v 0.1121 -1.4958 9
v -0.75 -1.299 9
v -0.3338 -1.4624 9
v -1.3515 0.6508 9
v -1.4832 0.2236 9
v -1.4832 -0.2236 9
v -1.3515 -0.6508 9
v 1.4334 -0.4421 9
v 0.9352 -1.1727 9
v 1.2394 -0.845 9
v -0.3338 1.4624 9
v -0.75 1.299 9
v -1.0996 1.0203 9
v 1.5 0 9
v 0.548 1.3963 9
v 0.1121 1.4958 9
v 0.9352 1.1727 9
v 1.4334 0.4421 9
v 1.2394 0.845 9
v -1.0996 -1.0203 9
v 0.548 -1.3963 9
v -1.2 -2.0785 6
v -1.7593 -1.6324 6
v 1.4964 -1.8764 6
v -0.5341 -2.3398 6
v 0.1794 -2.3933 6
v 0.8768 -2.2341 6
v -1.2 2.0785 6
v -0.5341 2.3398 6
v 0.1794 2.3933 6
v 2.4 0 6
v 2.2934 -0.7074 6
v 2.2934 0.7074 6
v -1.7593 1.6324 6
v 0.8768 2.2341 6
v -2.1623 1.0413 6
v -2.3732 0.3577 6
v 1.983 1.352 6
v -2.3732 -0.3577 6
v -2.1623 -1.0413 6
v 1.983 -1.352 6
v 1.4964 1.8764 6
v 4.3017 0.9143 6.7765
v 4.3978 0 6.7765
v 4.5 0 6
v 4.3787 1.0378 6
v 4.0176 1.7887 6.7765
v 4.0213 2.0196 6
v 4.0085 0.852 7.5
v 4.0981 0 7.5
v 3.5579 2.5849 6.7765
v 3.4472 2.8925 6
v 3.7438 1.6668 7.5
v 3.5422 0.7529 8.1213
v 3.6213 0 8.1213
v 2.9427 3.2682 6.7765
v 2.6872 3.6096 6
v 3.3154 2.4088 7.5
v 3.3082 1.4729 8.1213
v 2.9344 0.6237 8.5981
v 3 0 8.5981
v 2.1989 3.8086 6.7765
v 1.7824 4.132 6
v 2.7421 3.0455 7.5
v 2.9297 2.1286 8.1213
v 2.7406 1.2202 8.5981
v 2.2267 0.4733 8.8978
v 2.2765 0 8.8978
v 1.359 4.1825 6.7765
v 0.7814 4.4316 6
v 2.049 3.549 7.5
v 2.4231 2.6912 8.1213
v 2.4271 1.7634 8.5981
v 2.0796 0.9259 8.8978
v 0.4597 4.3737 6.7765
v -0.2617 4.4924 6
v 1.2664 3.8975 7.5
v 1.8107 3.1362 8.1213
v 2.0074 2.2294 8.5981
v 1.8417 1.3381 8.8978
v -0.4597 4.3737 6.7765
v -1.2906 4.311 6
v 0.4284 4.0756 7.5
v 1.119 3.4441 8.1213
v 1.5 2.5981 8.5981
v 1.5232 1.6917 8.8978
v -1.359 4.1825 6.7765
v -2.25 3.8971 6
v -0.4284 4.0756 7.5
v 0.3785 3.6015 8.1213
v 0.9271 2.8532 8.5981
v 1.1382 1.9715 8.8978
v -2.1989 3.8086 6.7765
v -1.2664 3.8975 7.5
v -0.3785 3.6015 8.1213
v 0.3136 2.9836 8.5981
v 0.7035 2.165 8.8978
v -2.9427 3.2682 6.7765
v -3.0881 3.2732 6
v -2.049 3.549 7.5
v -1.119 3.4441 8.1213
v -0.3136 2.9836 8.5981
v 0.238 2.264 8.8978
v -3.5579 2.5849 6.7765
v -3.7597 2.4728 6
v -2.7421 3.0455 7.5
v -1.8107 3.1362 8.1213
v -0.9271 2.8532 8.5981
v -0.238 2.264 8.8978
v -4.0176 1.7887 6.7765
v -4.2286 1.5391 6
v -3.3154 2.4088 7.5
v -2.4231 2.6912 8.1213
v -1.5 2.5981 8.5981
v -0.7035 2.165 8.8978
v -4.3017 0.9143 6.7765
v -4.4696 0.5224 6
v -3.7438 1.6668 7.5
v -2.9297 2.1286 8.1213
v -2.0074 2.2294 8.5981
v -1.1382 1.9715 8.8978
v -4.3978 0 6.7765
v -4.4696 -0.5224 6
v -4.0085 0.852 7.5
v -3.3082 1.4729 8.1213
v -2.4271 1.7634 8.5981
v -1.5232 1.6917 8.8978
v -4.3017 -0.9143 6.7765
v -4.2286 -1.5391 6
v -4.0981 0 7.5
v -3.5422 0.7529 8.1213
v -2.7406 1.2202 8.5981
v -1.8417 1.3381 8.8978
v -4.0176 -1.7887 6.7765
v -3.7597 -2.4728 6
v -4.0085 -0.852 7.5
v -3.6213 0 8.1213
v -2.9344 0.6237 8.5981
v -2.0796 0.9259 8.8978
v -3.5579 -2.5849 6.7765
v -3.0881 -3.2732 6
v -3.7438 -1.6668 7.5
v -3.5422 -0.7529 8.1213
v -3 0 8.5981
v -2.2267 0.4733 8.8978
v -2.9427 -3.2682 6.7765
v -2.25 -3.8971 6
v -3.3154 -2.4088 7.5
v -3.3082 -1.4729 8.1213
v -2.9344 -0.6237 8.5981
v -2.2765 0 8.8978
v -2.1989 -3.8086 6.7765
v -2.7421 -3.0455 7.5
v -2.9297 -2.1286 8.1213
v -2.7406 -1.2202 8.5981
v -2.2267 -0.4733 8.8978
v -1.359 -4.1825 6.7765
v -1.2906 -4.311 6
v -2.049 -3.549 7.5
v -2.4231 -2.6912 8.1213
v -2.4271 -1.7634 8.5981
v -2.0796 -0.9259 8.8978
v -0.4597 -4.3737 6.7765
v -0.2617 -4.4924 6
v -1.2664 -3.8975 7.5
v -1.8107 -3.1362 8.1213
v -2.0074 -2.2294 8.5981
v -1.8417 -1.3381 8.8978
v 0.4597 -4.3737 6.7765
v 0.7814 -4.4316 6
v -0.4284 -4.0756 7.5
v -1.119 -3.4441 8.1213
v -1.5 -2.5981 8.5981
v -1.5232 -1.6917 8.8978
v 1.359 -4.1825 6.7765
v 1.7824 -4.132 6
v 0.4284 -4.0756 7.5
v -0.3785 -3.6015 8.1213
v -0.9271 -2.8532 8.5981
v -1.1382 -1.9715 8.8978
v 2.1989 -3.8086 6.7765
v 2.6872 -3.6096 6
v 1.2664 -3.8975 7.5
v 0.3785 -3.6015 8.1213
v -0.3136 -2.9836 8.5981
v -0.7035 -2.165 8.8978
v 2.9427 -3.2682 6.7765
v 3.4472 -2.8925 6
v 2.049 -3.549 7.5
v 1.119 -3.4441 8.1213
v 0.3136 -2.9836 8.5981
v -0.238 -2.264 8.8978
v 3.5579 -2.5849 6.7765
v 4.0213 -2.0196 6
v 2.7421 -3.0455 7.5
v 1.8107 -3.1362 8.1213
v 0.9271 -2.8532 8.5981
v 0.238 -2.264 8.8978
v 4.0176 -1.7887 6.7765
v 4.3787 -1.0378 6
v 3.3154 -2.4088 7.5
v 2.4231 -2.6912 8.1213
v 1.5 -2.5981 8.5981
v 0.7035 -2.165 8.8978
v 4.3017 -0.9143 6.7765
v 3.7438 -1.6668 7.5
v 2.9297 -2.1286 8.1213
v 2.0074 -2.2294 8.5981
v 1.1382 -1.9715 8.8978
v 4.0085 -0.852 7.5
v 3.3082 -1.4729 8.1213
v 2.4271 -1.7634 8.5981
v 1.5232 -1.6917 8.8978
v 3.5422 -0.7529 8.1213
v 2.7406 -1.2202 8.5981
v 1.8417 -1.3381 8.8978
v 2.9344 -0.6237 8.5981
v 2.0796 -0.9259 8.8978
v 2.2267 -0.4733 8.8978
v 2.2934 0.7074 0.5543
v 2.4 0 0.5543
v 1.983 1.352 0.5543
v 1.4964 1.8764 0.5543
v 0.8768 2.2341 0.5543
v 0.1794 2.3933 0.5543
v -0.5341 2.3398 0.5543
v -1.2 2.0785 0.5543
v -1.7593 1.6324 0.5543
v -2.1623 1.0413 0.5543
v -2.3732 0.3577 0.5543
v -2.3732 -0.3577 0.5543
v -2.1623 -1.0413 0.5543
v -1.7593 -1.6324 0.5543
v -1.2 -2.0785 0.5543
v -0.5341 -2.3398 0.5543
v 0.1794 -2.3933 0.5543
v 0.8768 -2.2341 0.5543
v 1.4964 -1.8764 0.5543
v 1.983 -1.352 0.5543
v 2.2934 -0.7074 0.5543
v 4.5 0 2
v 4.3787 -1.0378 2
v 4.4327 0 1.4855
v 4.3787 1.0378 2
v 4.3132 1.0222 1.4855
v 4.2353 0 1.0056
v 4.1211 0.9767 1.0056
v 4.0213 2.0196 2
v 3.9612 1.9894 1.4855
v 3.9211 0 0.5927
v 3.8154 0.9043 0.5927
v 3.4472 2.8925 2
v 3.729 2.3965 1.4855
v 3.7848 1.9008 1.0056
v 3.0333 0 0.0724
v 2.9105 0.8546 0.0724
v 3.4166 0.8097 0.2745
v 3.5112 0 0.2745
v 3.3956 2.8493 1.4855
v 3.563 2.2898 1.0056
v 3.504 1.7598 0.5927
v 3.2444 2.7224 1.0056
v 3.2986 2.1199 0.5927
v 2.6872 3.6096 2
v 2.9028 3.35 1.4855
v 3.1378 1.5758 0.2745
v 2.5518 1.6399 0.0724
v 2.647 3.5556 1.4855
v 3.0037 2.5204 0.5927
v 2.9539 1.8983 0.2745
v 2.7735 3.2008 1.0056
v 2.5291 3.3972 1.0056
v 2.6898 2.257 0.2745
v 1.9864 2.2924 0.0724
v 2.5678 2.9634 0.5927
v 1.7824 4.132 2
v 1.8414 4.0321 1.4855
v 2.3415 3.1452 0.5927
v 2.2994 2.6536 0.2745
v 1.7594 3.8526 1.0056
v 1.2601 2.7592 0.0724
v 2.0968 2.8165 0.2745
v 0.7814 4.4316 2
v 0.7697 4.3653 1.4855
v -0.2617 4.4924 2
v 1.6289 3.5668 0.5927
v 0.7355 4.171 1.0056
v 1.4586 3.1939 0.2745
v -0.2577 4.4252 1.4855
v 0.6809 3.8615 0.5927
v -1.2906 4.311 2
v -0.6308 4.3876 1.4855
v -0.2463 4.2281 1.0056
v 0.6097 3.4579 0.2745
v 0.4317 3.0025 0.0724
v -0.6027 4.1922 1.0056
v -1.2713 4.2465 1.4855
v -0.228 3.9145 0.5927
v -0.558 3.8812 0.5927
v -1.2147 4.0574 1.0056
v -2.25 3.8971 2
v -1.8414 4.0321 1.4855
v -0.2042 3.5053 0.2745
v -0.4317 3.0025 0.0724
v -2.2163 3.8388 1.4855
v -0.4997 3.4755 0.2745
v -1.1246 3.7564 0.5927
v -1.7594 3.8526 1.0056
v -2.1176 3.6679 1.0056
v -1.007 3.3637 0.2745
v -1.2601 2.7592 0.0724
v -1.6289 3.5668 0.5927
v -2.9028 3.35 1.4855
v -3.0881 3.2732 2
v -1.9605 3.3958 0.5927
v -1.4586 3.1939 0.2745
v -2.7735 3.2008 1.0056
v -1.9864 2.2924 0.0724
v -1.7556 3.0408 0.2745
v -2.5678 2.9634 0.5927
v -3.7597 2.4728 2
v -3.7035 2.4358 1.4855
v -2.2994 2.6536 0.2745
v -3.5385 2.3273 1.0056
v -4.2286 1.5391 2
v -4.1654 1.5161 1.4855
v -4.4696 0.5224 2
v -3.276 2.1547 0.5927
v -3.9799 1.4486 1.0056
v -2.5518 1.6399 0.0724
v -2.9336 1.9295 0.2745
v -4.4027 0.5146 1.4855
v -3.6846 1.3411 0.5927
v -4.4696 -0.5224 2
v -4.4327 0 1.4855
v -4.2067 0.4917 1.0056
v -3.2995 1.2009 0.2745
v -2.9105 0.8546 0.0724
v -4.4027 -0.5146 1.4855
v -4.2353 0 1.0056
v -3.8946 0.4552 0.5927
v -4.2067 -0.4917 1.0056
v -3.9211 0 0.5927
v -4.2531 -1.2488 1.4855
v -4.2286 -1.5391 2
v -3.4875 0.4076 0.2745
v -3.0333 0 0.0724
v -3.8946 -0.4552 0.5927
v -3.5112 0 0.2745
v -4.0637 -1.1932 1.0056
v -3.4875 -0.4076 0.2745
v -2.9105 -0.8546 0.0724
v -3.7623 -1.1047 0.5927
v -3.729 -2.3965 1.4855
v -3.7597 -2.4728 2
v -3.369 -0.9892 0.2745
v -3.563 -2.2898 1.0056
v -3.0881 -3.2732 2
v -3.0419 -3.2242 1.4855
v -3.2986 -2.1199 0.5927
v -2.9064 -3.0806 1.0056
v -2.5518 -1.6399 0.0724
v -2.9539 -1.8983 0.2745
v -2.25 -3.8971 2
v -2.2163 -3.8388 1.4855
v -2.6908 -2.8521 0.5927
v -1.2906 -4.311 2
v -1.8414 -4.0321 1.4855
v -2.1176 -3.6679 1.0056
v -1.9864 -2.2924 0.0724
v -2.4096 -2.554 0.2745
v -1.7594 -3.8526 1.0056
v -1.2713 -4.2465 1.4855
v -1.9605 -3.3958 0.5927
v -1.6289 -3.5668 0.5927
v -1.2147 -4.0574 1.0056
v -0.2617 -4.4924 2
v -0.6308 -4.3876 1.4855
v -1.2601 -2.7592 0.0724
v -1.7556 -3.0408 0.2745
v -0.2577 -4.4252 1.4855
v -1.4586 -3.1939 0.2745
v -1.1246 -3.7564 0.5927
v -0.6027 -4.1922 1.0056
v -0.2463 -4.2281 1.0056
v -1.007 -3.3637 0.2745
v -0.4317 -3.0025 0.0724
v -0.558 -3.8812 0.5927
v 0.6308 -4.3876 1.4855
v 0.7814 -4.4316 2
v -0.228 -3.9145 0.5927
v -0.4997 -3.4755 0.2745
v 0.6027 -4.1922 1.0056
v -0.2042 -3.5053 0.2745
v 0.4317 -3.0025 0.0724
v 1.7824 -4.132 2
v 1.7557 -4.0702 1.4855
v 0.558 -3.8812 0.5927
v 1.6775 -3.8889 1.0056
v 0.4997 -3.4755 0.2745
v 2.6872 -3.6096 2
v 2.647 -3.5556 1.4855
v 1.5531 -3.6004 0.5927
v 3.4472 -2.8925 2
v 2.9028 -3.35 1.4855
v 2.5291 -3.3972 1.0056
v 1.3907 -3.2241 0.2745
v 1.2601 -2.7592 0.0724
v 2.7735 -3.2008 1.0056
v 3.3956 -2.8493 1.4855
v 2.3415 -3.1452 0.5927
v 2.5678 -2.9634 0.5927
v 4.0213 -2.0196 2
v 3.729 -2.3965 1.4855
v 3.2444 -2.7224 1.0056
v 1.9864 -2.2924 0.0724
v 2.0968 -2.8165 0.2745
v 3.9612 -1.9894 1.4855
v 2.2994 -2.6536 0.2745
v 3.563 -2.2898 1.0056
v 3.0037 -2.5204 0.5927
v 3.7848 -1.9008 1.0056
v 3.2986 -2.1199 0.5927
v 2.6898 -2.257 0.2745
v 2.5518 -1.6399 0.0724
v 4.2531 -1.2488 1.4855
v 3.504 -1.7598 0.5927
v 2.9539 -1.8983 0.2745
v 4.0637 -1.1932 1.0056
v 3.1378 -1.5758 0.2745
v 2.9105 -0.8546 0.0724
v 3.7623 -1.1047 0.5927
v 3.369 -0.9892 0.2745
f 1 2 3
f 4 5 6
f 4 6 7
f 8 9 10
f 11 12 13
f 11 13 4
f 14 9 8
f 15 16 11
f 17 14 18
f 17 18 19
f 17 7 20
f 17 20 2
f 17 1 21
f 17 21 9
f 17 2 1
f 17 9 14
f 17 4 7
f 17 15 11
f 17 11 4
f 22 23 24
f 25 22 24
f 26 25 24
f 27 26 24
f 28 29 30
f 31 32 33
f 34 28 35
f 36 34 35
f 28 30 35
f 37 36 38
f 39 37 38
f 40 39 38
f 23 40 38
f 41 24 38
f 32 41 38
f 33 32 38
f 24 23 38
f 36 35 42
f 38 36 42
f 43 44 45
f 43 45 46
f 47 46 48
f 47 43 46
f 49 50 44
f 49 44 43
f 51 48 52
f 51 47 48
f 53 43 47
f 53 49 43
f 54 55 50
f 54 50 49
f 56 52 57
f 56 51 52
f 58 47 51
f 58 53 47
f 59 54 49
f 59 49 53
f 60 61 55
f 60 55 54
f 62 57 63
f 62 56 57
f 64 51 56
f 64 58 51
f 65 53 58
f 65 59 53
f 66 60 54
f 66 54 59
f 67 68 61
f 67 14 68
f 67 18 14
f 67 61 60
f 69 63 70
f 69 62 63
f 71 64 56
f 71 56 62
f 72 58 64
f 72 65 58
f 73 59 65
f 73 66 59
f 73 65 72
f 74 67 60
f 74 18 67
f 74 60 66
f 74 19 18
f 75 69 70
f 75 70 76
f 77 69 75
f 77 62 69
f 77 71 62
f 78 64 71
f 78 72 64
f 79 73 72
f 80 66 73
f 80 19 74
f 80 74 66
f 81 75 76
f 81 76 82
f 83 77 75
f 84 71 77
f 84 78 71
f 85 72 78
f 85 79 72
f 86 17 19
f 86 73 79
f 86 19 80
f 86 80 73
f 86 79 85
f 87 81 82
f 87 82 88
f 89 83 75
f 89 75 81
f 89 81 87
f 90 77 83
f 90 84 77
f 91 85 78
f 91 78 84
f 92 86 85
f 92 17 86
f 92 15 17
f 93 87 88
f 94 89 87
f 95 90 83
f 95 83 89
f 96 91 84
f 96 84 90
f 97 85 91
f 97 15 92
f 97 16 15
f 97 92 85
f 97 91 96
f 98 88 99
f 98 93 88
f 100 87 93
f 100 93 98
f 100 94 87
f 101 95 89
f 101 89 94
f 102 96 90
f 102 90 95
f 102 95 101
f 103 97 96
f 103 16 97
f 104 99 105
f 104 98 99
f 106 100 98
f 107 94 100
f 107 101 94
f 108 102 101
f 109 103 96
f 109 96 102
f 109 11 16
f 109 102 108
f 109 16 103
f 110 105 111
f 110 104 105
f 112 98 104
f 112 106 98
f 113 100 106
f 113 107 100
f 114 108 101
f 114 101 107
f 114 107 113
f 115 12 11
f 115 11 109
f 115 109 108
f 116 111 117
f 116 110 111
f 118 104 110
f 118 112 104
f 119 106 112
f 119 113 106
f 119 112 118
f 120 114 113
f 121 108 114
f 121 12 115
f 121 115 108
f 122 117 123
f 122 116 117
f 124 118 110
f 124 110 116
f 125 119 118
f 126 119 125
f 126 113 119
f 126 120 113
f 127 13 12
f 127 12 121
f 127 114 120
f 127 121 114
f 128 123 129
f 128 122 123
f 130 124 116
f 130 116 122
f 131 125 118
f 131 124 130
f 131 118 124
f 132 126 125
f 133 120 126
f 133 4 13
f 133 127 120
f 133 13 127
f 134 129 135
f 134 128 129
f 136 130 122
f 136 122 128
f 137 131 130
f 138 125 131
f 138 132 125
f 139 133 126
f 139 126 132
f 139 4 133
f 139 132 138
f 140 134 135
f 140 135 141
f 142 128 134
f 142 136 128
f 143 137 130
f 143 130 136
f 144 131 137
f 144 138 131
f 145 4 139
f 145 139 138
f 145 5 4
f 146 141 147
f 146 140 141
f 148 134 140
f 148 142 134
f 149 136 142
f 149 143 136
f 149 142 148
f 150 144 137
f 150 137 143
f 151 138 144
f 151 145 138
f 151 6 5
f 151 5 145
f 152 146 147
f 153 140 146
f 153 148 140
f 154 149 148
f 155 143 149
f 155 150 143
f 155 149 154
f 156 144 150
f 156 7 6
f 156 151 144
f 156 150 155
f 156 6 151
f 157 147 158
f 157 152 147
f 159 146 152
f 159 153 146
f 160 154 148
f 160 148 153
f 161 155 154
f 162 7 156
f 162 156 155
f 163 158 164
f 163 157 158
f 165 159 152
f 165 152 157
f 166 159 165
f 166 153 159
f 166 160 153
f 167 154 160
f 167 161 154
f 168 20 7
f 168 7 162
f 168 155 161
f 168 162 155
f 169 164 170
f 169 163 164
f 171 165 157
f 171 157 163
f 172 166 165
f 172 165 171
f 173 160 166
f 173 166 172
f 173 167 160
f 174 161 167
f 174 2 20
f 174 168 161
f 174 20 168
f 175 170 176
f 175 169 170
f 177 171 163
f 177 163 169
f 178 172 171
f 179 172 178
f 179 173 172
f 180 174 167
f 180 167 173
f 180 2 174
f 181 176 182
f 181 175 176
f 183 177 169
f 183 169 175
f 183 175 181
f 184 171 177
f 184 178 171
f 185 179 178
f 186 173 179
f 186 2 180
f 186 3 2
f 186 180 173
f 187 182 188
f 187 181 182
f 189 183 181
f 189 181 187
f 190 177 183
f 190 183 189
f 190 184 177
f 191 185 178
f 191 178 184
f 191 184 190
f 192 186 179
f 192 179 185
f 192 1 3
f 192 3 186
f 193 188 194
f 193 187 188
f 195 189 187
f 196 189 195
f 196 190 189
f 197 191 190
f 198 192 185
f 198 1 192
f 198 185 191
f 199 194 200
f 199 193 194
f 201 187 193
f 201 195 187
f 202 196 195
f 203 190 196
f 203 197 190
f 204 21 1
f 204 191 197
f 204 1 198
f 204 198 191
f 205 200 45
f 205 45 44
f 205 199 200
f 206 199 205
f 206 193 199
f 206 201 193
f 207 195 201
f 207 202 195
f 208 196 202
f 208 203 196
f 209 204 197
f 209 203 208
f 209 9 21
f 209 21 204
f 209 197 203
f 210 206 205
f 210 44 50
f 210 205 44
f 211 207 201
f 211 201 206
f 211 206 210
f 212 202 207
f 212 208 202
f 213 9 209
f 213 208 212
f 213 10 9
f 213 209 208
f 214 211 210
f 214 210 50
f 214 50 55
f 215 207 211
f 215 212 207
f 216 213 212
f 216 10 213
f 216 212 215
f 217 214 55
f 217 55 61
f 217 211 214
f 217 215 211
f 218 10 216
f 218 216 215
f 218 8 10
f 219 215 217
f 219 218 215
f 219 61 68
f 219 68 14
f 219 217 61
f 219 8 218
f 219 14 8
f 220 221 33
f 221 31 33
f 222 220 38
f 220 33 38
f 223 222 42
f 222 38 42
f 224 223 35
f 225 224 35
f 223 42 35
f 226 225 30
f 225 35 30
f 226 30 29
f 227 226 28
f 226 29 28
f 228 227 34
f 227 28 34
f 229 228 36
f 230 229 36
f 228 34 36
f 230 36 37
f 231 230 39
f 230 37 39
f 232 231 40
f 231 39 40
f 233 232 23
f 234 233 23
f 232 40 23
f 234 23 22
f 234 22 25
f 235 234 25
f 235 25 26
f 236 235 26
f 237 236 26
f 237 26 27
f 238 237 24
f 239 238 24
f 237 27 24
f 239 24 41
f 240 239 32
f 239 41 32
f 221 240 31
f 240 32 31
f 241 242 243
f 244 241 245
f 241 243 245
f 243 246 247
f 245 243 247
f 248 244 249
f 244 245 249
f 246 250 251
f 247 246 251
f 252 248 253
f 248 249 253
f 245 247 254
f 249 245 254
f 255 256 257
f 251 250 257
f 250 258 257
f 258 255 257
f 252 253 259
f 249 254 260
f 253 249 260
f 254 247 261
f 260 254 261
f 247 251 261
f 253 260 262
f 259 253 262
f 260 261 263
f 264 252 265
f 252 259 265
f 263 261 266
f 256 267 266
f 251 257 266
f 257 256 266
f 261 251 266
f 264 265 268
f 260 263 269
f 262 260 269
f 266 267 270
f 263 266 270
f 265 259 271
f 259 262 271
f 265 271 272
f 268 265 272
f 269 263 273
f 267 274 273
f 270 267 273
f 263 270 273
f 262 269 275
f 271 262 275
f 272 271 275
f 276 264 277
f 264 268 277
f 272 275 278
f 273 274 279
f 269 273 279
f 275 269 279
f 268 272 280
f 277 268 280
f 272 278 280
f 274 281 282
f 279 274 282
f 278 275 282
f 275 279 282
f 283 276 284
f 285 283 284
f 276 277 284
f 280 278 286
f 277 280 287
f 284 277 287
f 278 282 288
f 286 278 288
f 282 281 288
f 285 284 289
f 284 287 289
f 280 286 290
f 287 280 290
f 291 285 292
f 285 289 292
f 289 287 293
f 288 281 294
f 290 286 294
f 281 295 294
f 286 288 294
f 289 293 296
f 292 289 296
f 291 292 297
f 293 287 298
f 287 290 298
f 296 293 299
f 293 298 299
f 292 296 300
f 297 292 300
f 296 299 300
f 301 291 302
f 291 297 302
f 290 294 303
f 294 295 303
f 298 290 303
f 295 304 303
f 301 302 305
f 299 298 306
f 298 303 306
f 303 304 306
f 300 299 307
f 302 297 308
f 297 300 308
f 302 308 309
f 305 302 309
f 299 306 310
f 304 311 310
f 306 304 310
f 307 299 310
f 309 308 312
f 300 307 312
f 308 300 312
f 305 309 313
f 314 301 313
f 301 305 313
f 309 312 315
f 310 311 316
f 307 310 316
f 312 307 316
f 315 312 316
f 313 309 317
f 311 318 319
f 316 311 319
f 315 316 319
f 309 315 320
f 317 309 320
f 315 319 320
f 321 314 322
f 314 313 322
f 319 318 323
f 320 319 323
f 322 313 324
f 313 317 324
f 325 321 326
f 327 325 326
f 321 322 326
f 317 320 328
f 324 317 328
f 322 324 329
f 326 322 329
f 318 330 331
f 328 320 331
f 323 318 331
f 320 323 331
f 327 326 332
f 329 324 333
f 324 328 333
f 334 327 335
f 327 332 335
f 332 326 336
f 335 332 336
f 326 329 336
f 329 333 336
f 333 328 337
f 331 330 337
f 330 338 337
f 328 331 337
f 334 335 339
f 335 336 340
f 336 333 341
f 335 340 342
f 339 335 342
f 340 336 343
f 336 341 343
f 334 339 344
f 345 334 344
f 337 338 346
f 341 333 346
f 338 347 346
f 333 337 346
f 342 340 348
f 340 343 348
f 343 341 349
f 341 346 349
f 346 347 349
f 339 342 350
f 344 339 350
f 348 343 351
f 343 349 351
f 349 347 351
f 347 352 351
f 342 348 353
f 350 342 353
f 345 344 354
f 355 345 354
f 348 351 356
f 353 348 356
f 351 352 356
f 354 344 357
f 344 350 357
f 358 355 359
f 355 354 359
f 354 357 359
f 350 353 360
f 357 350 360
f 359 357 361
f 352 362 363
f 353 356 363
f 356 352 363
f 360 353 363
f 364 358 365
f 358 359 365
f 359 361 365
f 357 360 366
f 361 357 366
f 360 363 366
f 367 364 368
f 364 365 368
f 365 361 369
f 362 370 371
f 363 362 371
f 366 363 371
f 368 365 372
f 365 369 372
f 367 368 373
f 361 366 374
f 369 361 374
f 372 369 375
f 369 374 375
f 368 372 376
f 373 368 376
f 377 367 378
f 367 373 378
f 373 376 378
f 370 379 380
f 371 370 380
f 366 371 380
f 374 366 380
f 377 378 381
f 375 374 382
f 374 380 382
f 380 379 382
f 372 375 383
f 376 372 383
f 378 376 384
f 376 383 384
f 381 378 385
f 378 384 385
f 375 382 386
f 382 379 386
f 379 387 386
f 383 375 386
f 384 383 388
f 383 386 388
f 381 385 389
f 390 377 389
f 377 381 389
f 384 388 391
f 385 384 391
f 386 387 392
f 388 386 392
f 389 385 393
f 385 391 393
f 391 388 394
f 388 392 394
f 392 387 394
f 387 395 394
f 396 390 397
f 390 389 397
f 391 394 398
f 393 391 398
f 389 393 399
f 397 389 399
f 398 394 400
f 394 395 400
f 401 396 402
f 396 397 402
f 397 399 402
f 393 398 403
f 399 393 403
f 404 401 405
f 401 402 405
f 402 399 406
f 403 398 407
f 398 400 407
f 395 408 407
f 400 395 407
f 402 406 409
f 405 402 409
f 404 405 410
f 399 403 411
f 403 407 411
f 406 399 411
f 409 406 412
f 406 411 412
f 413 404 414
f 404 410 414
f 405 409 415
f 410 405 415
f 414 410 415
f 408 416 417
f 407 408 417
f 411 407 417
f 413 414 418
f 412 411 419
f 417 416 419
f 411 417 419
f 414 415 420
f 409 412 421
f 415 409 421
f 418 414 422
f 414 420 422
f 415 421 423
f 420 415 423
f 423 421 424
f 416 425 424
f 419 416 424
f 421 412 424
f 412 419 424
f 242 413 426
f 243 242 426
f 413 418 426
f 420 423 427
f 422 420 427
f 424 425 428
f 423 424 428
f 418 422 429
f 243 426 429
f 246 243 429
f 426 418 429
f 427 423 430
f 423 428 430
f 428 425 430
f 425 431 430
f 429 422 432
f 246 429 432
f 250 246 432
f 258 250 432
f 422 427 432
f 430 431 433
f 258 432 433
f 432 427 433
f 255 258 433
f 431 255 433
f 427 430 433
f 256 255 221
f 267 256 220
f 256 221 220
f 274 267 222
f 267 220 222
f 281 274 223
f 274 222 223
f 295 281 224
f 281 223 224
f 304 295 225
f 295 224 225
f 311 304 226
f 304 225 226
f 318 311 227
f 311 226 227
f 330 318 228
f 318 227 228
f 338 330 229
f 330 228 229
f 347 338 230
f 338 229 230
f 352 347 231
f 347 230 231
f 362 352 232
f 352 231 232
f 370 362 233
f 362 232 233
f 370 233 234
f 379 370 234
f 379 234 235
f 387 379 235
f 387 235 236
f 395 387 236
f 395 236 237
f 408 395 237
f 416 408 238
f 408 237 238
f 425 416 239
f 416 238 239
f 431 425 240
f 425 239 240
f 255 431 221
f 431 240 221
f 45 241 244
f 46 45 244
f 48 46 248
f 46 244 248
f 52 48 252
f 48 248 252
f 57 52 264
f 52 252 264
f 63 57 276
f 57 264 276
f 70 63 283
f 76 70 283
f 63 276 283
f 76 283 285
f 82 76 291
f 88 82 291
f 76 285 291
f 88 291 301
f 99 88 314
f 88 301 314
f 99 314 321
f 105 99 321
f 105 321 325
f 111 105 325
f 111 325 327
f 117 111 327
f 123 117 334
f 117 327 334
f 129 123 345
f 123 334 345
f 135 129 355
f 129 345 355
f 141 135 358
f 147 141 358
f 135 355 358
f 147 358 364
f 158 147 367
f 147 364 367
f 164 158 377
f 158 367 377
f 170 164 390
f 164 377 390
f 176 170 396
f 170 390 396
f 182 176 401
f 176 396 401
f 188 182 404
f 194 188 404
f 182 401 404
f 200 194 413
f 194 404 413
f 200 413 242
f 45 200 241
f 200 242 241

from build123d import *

# Parameters (mm, degrees)
SKETCH1_R           = 4.5
SKETCH1_R_2         = 2.4
BOSS_EXTRUDE1_DEPTH = 9
FILLET1_R           = 3
FILLET2_R           = 2
SKETCH1_4_R         = 2.4
CUT_EXTRUDE2_DEPTH  = 6


with BuildPart() as part:
    # Sketch1 → Boss-Extrude1 (new body)
    # profile 1 of 2: a face of its own
    with BuildSketch(Plane.XY):
        Circle(SKETCH1_R)
        Circle(SKETCH1_R_2, mode=Mode.SUBTRACT)
    # profile 2 of 2: a face of its own
    with BuildSketch(Plane.XY):
        Circle(SKETCH1_R_2)
    extrude(amount=BOSS_EXTRUDE1_DEPTH)

    # Fillet1
    fillet1_edges = [part.edges().sort_by_distance(p)[0] for p in [
        (-4.5, 0, 9),
    ]]
    fillet(fillet1_edges, radius=FILLET1_R)

    # Fillet2
    fillet2_edges = [part.edges().sort_by_distance(p)[0] for p in [
        (-4.5, 0, 0),
    ]]
    fillet(fillet2_edges, radius=FILLET2_R)

    # Sketch1<4> → Cut-Extrude2 (cut, symmetric)
    with BuildSketch(Plane.XY):
        Circle(SKETCH1_4_R)
    extrude(amount=CUT_EXTRUDE2_DEPTH, both=True, mode=Mode.SUBTRACT)

    # Chamfer1: read off the stored shape, not the designer's step
    # Chamfer1 outline → Chamfer1 (revolve, cut)
    with BuildSketch(Plane.XZ):
        Polygon((2.4, 0.554316771), (2.4, 0), (3.033333333, 0), (3.033333333, 0.072422361), align=None)
    revolve(axis=Axis((0, 0, 0), (0, 0, 1)), mode=Mode.SUBTRACT)


solid = part.part
